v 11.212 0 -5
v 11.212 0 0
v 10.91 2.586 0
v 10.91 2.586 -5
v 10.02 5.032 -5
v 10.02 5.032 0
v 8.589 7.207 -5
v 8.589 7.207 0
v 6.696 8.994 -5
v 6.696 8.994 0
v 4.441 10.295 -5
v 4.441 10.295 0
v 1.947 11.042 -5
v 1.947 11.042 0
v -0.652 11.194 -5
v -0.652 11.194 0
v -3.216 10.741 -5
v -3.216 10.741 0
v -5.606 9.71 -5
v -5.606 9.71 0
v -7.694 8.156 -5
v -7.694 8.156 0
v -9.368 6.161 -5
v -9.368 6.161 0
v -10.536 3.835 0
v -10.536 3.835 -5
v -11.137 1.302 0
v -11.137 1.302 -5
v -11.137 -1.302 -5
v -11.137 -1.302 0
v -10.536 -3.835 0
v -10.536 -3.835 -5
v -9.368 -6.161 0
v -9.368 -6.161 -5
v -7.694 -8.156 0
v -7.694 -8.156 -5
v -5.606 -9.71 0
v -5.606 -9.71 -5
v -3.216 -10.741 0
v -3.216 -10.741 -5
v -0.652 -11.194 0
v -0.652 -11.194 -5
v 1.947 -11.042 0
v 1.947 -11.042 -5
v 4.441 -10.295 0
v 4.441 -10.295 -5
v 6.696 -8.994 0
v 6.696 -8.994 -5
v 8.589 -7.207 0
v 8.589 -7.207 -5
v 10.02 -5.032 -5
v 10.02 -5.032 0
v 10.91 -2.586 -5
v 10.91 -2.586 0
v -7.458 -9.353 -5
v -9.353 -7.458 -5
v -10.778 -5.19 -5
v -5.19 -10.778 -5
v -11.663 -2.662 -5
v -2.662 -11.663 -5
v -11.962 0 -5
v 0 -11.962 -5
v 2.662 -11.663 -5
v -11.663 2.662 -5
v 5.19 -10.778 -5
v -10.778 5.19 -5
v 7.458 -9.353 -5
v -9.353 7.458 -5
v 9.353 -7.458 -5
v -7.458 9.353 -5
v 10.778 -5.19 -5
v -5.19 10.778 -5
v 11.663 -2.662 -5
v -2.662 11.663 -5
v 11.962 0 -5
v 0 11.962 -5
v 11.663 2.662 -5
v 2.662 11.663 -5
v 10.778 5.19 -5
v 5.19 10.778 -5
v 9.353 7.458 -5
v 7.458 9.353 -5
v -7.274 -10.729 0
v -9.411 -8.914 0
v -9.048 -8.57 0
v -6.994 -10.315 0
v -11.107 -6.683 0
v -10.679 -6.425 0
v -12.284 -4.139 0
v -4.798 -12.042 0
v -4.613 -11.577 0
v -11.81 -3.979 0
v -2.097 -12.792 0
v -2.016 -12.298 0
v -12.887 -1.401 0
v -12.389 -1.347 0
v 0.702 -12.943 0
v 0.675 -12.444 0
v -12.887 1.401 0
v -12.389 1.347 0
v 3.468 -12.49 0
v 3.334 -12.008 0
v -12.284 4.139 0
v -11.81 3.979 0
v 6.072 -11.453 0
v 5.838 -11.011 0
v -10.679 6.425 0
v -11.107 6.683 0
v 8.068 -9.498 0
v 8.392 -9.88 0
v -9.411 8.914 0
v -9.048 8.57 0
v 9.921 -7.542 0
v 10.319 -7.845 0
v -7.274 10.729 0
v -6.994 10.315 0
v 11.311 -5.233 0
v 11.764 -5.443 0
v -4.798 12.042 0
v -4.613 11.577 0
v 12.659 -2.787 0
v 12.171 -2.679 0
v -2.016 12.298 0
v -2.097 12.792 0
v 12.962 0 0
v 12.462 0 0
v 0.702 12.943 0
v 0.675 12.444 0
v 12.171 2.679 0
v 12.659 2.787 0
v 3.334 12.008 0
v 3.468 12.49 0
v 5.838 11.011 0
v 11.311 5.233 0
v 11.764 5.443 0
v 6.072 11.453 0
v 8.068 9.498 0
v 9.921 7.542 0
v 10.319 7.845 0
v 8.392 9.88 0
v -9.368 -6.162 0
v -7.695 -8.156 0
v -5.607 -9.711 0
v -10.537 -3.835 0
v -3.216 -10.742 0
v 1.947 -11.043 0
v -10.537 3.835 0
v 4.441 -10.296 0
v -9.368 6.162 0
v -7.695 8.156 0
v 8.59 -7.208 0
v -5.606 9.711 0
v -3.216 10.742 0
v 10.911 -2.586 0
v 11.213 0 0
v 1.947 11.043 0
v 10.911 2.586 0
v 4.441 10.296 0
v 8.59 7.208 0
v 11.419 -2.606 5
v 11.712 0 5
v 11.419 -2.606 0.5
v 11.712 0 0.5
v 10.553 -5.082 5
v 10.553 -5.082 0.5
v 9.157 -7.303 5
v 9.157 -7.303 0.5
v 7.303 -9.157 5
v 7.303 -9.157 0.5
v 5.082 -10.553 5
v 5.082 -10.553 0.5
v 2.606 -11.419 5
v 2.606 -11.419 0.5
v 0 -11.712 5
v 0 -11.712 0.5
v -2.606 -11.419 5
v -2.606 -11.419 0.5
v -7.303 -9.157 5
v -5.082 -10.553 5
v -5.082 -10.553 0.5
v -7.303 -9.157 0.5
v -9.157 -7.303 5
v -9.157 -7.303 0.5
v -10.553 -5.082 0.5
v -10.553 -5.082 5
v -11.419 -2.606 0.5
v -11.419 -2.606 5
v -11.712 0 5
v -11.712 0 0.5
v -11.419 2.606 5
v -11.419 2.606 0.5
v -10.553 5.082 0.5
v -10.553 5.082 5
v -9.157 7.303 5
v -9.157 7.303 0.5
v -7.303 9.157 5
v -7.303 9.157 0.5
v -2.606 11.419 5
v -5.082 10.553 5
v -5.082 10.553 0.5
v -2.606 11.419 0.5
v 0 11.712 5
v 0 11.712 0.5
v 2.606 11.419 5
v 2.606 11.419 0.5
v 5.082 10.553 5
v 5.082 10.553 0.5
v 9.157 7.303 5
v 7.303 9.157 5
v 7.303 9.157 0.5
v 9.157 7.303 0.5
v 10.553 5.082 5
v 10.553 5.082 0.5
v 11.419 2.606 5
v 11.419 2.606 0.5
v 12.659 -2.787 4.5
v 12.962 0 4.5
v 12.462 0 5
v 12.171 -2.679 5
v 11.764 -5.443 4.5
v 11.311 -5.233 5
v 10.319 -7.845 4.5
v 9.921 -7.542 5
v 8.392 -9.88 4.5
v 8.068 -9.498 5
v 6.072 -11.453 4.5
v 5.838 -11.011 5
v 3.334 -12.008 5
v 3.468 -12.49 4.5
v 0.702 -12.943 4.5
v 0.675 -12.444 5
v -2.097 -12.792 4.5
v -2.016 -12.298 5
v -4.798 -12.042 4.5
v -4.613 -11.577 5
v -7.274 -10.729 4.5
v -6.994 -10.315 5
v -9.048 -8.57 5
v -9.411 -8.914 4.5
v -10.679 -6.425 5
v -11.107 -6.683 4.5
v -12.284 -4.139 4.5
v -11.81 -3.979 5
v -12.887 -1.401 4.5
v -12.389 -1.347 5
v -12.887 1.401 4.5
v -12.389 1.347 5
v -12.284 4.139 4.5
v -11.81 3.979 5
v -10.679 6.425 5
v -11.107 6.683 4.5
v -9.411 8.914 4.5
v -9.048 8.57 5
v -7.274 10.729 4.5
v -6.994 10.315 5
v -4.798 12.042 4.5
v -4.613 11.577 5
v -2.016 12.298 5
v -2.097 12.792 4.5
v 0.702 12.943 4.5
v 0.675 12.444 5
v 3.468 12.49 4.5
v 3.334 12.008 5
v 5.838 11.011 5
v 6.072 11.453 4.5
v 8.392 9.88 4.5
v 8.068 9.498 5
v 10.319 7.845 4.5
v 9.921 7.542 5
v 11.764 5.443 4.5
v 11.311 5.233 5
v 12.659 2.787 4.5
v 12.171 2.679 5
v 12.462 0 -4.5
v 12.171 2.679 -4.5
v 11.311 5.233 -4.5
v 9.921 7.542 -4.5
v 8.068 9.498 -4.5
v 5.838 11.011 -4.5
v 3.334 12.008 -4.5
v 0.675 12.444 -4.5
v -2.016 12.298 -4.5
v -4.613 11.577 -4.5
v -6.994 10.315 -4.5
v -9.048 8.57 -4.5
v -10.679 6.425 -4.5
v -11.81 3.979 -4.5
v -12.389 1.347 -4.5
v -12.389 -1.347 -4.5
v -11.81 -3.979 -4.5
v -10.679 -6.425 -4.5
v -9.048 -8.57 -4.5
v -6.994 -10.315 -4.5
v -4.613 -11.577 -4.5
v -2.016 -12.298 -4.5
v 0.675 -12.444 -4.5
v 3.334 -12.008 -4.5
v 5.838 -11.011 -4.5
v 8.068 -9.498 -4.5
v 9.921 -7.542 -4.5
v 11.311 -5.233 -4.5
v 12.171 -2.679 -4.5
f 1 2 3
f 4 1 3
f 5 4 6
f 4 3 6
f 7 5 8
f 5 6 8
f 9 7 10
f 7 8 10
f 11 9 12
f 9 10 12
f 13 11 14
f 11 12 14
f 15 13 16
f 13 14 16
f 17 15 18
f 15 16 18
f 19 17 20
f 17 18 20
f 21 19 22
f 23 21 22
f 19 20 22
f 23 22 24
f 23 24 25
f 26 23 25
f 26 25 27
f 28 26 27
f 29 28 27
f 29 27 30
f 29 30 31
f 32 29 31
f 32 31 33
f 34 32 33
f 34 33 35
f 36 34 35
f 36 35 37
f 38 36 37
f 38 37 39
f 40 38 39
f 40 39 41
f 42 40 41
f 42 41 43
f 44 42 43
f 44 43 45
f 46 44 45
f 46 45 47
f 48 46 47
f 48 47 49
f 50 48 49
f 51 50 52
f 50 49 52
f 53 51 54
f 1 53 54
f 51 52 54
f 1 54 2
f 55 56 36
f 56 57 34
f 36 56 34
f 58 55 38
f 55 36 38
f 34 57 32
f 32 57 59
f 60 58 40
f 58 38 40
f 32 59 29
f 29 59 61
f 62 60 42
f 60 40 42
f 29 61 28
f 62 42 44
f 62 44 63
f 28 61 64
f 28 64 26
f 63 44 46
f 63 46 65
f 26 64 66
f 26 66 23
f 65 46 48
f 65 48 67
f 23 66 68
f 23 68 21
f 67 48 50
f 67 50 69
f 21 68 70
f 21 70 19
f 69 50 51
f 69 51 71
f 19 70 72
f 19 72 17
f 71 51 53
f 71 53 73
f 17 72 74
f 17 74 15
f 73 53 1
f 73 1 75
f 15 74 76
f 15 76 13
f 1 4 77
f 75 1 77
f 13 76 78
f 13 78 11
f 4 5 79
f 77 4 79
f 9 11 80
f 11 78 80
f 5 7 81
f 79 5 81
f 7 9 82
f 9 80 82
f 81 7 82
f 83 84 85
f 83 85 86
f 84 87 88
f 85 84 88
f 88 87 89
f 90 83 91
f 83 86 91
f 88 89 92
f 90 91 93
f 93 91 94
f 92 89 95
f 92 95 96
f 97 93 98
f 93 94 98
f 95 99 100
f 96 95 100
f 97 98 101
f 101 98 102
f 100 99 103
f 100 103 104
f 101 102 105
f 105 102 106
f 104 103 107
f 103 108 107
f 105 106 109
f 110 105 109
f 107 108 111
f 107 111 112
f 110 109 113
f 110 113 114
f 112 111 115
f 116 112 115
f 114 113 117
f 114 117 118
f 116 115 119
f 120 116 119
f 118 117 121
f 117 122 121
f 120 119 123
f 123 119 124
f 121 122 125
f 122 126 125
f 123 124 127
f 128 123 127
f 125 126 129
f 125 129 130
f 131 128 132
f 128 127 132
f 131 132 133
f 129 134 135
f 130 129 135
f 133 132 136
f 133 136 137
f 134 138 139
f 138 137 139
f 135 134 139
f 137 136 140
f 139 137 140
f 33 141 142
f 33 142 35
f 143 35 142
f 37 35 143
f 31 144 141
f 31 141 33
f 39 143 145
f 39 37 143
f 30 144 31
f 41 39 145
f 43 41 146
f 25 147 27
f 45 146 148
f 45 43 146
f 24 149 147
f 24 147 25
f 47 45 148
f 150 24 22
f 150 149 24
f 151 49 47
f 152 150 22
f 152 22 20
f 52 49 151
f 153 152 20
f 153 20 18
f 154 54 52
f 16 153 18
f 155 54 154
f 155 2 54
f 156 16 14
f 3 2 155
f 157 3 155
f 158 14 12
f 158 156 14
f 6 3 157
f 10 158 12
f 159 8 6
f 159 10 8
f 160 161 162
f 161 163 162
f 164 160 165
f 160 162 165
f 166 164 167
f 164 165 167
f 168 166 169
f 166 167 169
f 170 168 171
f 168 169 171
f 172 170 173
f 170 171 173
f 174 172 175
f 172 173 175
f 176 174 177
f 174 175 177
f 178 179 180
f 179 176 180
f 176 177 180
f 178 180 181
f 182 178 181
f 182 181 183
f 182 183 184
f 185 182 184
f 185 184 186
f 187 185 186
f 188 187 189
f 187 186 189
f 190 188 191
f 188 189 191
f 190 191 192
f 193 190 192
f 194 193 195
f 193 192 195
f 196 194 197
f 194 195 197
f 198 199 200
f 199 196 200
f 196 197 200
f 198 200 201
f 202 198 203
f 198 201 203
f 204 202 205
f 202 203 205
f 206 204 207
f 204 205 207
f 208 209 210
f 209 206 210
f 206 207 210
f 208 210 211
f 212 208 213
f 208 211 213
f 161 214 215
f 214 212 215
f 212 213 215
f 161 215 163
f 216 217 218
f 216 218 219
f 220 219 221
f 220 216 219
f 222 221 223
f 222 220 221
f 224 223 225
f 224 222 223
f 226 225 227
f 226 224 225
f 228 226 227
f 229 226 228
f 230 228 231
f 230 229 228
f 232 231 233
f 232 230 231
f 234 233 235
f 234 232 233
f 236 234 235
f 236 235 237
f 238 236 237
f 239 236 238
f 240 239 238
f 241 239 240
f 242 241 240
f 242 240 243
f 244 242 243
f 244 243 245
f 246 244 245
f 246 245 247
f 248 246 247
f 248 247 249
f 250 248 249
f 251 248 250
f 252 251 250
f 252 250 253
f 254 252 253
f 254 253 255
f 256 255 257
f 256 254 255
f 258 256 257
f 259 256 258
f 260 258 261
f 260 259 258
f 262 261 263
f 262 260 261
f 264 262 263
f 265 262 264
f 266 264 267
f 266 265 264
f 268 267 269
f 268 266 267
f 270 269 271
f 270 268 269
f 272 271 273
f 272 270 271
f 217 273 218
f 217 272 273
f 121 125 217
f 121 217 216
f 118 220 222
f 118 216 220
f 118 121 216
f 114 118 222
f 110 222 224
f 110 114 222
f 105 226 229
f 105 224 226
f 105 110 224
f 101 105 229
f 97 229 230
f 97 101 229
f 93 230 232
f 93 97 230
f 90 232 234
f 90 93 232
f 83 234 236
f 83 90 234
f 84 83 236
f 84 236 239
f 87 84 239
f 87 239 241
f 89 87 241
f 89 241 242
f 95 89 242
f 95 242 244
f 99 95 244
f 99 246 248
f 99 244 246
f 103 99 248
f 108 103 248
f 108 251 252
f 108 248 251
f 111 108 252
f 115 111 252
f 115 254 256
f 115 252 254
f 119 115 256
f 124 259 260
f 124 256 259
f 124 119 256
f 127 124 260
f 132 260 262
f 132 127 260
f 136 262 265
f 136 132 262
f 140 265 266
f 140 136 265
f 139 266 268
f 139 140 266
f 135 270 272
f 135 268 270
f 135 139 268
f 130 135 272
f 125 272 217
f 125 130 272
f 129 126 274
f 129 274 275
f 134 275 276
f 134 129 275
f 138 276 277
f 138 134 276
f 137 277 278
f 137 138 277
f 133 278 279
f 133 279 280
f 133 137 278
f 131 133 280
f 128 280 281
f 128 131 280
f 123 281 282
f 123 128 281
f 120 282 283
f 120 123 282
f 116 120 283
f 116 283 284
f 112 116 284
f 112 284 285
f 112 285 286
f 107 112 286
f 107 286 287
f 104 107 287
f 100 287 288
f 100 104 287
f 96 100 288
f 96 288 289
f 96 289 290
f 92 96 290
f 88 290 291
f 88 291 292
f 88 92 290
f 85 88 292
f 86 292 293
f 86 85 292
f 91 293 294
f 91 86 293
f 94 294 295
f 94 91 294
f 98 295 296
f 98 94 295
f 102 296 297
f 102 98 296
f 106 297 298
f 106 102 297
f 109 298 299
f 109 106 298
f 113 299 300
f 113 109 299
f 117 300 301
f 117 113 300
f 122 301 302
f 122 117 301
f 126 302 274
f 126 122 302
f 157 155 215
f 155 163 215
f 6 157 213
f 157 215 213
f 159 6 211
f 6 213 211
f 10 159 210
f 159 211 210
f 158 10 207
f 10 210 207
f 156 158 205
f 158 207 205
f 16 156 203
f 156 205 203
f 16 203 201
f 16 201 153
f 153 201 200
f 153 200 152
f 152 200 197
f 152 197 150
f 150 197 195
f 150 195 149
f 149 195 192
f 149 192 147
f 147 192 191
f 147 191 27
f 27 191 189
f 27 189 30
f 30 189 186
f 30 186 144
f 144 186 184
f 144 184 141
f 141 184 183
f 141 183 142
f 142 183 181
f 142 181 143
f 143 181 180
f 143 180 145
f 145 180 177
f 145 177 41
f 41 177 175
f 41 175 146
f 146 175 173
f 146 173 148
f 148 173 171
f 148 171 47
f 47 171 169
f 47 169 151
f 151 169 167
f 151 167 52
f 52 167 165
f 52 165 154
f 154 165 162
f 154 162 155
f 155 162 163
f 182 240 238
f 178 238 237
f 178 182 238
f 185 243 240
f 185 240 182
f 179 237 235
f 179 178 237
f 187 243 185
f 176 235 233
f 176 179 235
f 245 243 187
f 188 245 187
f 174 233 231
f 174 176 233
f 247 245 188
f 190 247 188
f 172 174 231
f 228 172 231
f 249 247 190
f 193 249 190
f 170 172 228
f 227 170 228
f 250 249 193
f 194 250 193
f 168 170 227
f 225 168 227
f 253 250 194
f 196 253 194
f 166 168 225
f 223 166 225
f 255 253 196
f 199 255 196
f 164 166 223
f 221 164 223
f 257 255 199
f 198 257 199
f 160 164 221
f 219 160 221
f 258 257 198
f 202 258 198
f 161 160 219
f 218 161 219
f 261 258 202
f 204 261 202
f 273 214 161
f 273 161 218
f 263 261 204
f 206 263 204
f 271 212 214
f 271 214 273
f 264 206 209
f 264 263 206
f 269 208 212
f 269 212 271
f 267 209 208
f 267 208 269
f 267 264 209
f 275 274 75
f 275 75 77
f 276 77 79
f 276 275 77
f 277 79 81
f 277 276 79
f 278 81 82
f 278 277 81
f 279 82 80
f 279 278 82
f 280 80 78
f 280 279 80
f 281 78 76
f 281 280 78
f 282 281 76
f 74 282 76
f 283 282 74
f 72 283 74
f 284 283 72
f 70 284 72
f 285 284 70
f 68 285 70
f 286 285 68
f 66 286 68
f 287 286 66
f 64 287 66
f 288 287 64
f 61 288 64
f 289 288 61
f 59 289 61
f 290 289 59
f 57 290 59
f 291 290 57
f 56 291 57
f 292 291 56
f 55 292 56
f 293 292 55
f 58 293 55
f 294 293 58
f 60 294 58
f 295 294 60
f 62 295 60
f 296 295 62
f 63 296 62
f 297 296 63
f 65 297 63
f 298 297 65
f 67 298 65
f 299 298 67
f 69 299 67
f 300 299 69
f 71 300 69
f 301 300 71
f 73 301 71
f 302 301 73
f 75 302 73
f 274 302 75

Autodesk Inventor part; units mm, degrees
ref_plane "YZ Plane" through (0, 0, 0) normal (1, 0, 0) x (0, 1, 0)
ref_plane "XZ Plane" through (0, 0, 0) normal (0, 1, 0) x (-1, 0, 0)
ref_plane "XY Plane" through (0, 0, 0) normal (0, 0, 1) x (1, 0, 0)
sketch "Sketch1" plane through (0, 0, 0) normal (0, 0, 1) x (1, 0, 0)
  circle A0 centre (0, 0) radius 12.4625
  circle A1 centre (0, 0) radius 12.9625
  circle A2 centre (0, 0) radius 11.7125
  circle A3 centre (0, 0) radius 11.2125
  dimension "d0" = 24.925
  dimension "d1" = 25.925
  dimension "d2" = 1.25
  dimension "d3" = 1.25
extrude "Extrusion1" add sketch "Sketch1" along normal blind 5 contours A0 | A1
extrude "Extrusion2" add sketch "Sketch1" against normal blind 5 contours A0 | A2
chamfer "Chamfer1" distance 0.5 angle 45 1 edges at (-11.7125, 0, 0)
chamfer "Chamfer2" distance 0.5 angle 45 2 edges at (-12.4625, 0, -5) (-12.9625, 0, 5)
properties part number "Camera Mount Adapter"
